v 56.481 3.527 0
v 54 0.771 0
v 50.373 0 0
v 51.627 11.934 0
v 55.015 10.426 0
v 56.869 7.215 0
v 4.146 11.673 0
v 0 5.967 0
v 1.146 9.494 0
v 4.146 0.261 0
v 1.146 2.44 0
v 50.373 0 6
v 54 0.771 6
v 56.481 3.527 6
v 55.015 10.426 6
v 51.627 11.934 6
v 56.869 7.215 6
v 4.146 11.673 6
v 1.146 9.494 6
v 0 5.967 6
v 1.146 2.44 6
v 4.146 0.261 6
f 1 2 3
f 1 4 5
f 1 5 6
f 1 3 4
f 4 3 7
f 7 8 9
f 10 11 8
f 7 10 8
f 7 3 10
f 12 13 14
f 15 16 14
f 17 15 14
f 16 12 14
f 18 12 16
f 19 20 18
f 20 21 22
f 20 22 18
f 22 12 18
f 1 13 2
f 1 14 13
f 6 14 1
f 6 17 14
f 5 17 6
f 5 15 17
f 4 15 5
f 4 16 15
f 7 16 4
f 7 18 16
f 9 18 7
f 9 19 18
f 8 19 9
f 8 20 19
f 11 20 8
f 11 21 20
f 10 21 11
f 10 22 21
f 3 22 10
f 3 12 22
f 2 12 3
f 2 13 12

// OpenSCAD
$fn = 32;

// ----------------------------------------------------------------------
// Lever arm: two bosses 12 and 12 mm, 45 mm between centres
// ----------------------------------------------------------------------

// --- parameters (mm) ---
profile_height = 6;       // extrusion height
profile_points = 11;      // points of the closed outline

profile = [[0, 5.967], [1.146, 2.44], [4.146, 0.261], [50.373, 0], [54, 0.771], [56.481, 3.527], [56.869, 7.215], [55.015, 10.426], [51.627, 11.934], [4.146, 11.673], [1.146, 9.494]];  // single closed polygon, 11 points, counter clockwise

// --- the one profile operation ---
linear_extrude(height = profile_height) polygon(points = profile);
